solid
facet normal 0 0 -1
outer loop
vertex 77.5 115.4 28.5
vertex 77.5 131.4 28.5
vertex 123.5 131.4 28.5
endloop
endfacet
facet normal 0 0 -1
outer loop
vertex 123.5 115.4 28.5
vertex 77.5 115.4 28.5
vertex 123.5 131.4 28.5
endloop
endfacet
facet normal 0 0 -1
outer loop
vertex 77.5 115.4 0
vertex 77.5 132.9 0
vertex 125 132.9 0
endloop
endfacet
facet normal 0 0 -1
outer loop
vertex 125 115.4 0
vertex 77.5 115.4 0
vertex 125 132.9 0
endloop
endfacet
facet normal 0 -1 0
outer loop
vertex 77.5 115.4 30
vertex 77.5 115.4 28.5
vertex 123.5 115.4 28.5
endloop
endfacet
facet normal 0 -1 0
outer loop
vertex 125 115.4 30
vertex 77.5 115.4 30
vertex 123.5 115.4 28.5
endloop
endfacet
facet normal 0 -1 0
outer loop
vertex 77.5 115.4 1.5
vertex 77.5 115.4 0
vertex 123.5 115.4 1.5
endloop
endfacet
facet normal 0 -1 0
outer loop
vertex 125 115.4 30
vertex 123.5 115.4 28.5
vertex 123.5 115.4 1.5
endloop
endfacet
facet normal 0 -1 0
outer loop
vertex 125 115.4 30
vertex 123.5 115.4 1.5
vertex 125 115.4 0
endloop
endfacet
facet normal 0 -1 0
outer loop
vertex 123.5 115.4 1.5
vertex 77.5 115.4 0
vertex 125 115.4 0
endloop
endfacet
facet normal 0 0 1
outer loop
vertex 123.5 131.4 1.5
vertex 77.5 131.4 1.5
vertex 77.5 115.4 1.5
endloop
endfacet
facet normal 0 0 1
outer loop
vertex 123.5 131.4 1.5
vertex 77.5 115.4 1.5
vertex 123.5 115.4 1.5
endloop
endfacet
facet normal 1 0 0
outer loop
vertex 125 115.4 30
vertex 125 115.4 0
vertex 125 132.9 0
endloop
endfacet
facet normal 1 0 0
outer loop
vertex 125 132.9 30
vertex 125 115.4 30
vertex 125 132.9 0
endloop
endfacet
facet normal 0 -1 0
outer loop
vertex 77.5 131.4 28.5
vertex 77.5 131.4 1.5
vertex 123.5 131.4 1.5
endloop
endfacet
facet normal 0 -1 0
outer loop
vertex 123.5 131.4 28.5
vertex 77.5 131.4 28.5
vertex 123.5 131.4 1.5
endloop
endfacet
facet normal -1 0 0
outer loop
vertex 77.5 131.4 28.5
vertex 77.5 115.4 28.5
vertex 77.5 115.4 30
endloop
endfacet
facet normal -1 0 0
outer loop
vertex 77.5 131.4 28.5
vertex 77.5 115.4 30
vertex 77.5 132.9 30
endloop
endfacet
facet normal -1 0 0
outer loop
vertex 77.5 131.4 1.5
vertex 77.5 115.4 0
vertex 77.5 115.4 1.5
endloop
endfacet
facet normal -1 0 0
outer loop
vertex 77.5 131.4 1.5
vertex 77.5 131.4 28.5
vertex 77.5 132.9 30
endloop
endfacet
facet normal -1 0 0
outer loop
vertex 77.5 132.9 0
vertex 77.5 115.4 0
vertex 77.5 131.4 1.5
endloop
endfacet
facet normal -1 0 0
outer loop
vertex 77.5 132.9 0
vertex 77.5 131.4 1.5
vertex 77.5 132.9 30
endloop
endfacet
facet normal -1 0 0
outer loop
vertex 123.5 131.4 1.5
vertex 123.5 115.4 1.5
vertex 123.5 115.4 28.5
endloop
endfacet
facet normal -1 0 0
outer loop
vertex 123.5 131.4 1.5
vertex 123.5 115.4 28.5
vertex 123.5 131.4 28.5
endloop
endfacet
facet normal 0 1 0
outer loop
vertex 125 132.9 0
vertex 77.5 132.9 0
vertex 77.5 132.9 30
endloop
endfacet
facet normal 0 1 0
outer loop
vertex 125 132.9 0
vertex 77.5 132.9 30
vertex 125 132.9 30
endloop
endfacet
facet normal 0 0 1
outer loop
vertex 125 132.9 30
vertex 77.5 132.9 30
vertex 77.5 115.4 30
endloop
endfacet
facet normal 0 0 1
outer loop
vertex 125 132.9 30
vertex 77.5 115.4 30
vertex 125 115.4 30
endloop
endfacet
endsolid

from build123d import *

# Parameters (mm, degrees)
BOX026_W     = 47.5
BOX026_H     = 16
BOX026_DEPTH = 27
BOX027_W     = 47.5
BOX027_H     = 17.5
BOX027_DEPTH = 30


with BuildPart() as cube026:
    # Box026 → Box026 (new body)
    with BuildSketch(Plane(origin=(-1.5, 0, 60), x_dir=(1, 0, 0), z_dir=(0, 0, 1))):
        with Locations((23.75, 8)):
            Rectangle(BOX026_W, BOX026_H)
    extrude(amount=BOX026_DEPTH)


with BuildPart() as cut035:
    # Box027 → Box027 (new body)
    with BuildSketch(Plane.XY.offset(58.5)):
        with Locations((23.75, 8.75)):
            Rectangle(BOX027_W, BOX027_H)
    extrude(amount=BOX027_DEPTH)

    # Cut035: cut Cube026
    add(cube026.part, mode=Mode.SUBTRACT)


with BuildPart() as cut035_1:
    # Cut035 placement: moved
    add(cut035.part.moved(Location((77.5, 115.4, -58.5))))


solid = cut035_1.part
